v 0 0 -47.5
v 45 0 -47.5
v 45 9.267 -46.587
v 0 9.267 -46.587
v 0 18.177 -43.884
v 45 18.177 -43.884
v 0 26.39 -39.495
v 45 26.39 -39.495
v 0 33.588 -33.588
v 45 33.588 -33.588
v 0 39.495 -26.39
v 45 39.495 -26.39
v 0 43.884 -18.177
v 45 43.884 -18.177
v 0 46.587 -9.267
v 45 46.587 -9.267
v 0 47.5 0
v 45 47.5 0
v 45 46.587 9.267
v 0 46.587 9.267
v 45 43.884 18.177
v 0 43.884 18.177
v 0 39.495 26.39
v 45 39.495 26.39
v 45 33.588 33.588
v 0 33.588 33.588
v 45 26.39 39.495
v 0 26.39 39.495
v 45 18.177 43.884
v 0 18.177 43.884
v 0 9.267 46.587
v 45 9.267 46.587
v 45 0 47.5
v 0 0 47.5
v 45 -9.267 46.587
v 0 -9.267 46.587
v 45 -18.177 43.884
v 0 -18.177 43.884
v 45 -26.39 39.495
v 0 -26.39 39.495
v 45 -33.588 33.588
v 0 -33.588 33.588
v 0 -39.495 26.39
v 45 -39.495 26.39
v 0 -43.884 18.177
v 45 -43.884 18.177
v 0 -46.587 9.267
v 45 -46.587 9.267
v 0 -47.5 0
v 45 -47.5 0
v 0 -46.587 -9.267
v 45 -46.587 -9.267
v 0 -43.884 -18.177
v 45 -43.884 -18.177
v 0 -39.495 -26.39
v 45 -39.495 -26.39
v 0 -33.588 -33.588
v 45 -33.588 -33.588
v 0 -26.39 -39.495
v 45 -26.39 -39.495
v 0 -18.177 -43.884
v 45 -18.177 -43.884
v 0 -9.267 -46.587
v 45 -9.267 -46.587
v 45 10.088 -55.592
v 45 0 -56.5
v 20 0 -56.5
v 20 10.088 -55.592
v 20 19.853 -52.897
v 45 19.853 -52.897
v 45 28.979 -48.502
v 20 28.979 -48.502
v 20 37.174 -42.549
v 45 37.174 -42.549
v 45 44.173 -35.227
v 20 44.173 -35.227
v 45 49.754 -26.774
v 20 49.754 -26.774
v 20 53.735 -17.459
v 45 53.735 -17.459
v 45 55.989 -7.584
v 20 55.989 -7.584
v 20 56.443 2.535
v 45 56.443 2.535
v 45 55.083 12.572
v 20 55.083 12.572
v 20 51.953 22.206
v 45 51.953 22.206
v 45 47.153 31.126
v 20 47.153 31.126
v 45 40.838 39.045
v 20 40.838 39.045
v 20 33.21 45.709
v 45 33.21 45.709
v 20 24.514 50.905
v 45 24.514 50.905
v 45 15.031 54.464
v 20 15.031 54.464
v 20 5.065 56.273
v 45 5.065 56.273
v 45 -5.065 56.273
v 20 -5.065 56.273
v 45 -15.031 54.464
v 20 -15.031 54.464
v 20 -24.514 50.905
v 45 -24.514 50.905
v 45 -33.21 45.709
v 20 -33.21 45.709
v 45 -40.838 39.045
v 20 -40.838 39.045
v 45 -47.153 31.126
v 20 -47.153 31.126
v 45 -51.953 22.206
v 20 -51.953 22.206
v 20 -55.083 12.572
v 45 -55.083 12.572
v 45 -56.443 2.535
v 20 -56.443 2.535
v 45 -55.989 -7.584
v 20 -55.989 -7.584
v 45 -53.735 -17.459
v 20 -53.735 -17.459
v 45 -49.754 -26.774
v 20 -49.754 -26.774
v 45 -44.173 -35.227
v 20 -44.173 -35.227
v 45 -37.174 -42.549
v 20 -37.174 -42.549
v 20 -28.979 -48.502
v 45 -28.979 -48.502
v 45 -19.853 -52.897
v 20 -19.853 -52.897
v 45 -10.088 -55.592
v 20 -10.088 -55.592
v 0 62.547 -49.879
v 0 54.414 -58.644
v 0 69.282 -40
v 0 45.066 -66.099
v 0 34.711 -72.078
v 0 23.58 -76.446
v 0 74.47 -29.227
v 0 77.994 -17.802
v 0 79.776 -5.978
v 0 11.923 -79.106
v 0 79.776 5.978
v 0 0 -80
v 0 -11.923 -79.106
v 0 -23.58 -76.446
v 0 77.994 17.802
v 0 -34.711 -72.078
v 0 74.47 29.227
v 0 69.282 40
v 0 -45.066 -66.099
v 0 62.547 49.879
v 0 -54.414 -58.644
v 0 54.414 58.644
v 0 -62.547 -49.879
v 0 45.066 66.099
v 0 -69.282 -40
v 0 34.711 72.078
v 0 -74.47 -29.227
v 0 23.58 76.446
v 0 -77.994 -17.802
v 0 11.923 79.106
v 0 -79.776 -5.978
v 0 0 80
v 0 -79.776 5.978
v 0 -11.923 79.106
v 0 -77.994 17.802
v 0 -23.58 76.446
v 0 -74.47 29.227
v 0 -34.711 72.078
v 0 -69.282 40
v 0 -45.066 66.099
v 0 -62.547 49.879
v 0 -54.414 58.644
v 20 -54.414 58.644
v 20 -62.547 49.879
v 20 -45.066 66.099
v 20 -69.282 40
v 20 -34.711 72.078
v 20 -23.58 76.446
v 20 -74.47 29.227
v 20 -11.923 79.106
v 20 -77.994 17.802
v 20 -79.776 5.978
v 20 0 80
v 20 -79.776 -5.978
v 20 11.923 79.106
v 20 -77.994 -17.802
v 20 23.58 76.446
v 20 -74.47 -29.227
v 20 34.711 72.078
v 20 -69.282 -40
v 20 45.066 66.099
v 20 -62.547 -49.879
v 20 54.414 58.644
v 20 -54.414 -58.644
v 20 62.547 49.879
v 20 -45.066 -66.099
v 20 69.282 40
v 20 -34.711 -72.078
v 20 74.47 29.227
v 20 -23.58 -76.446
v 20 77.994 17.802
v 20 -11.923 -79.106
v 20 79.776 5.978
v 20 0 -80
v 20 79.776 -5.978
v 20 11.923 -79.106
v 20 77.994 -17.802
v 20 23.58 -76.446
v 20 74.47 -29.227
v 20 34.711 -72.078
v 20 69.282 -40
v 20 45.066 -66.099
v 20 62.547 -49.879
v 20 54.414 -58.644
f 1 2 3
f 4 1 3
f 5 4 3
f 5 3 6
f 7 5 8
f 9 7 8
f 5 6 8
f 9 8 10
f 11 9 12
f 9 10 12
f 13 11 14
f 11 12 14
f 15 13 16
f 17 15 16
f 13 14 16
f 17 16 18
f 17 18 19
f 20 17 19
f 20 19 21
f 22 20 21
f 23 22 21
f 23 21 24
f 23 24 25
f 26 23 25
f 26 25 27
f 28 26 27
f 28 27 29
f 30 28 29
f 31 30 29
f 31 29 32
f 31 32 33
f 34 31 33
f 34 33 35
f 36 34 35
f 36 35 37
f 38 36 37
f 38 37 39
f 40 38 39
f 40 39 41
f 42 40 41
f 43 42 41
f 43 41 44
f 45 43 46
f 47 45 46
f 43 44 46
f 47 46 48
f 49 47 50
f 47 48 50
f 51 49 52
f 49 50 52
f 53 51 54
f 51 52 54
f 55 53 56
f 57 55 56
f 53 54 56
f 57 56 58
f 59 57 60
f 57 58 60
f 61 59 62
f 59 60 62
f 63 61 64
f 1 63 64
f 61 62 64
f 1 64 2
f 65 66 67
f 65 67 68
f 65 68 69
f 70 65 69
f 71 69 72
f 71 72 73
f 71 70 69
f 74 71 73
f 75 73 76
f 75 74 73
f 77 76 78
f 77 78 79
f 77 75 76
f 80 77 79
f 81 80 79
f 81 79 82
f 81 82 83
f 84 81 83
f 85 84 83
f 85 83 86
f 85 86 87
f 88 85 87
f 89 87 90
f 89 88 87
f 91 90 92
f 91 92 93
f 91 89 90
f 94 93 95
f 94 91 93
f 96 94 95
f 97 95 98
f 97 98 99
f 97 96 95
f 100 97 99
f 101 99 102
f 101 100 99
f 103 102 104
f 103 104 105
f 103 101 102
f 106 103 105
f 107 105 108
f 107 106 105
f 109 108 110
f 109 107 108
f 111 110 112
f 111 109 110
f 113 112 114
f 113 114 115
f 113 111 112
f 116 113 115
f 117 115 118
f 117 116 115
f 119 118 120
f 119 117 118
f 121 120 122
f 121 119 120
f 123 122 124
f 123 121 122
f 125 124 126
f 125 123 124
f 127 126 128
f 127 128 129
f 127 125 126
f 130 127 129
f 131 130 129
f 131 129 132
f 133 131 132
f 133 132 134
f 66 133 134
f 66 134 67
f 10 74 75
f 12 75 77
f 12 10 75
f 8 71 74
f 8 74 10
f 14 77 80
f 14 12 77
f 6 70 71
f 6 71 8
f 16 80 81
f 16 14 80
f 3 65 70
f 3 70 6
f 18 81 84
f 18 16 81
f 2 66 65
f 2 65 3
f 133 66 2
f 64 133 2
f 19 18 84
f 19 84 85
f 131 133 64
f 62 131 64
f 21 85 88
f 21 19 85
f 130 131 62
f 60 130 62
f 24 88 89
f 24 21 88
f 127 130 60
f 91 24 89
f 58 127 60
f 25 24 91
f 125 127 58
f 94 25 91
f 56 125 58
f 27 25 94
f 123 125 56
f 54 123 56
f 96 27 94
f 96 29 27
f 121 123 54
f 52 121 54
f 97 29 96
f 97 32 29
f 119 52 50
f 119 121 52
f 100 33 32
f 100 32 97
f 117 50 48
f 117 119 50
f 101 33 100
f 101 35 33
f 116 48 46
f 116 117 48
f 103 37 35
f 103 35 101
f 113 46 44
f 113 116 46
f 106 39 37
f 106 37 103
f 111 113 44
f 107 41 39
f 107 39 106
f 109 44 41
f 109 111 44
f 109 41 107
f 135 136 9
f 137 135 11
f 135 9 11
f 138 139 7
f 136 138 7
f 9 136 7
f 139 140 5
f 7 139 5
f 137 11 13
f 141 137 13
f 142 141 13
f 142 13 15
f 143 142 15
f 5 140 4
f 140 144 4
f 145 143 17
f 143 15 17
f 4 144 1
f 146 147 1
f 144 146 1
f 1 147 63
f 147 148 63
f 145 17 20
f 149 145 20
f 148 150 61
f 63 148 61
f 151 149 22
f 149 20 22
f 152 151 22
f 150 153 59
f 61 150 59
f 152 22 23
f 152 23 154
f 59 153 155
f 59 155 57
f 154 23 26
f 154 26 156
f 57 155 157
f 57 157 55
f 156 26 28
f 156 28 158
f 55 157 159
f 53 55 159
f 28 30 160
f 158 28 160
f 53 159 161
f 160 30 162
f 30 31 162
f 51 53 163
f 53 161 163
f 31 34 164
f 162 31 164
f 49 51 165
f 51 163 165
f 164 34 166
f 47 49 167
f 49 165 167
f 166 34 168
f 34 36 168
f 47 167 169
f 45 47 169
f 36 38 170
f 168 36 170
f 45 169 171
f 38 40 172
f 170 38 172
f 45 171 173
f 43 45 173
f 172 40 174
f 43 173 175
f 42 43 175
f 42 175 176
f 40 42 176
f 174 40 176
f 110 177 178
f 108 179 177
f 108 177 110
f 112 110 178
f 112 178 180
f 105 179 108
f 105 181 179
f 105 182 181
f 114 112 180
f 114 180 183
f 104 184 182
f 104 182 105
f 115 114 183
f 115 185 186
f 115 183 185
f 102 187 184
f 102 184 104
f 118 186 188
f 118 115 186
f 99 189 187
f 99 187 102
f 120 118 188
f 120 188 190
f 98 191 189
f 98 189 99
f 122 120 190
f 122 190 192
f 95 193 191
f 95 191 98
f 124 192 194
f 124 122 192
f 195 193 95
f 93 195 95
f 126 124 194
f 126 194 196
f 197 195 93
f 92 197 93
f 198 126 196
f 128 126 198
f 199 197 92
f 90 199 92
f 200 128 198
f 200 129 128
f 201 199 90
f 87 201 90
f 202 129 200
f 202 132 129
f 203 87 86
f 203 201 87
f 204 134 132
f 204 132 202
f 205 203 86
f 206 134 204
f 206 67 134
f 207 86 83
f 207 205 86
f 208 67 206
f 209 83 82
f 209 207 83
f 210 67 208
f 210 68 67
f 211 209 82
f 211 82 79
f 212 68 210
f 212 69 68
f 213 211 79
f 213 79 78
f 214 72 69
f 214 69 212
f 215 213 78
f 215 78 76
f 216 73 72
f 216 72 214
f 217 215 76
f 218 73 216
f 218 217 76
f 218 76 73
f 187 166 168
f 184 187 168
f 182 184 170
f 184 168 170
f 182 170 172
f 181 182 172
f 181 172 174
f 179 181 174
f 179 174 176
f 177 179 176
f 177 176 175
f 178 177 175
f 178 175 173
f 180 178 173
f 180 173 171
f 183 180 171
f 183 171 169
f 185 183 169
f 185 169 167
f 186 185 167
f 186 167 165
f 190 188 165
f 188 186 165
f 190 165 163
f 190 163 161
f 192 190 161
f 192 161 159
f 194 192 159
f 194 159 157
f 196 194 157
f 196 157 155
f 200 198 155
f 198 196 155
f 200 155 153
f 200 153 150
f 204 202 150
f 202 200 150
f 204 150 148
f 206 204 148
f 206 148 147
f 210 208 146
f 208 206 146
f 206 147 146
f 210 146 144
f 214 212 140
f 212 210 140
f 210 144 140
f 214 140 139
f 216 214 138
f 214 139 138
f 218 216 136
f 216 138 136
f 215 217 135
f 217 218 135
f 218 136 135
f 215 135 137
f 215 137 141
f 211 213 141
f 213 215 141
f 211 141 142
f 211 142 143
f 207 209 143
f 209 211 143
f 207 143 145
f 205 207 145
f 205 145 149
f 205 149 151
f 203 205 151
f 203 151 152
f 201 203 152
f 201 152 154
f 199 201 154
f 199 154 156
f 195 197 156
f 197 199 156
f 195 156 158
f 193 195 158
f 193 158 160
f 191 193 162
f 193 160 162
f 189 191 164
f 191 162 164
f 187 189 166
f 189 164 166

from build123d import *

# Parameters (mm, degrees)
SKETCH_1_R          = 80
EXTRUDE_1_DEPTH     = 45
SKETCH_2_R          = 47.5
CUT_EXTRUDE_1_DEPTH = 122.757956619
SKETCH_3_OUTSIDE_W  = 208.142
SKETCH_3_OUTSIDE_H  = 208.142
SKETCH_3_OUTSIDE_R  = 56.5
CUT_EXTRUDE_2_DEPTH = 25


with BuildPart() as part:
    # 草图1 → 凸台-拉伸1 (new body)
    with BuildSketch(Plane(origin=(0, 0, 0), x_dir=(0, 0, -1), z_dir=(1, 0, 0))):
        with Locations(Location((0, 0, 0), (0, 0, 180))):
            Circle(SKETCH_1_R)
    extrude(amount=EXTRUDE_1_DEPTH)

    # 草图2 → 切除-拉伸1 (cut, through all)
    with BuildSketch(Plane(origin=(45, 0, 0), x_dir=(0, 0, -1), z_dir=(1, 0, 0))):
        Circle(SKETCH_2_R)
    extrude(amount=-CUT_EXTRUDE_1_DEPTH, mode=Mode.SUBTRACT)

    # 草图3 outside → 切除-拉伸2 (cut)
    with BuildSketch(Plane(origin=(45, 0, 0), x_dir=(0, 0, -1), z_dir=(1, 0, 0))):
        Rectangle(SKETCH_3_OUTSIDE_W, SKETCH_3_OUTSIDE_H)
        Circle(SKETCH_3_OUTSIDE_R, mode=Mode.SUBTRACT)
    extrude(amount=-CUT_EXTRUDE_2_DEPTH, mode=Mode.SUBTRACT)


solid = part.part
